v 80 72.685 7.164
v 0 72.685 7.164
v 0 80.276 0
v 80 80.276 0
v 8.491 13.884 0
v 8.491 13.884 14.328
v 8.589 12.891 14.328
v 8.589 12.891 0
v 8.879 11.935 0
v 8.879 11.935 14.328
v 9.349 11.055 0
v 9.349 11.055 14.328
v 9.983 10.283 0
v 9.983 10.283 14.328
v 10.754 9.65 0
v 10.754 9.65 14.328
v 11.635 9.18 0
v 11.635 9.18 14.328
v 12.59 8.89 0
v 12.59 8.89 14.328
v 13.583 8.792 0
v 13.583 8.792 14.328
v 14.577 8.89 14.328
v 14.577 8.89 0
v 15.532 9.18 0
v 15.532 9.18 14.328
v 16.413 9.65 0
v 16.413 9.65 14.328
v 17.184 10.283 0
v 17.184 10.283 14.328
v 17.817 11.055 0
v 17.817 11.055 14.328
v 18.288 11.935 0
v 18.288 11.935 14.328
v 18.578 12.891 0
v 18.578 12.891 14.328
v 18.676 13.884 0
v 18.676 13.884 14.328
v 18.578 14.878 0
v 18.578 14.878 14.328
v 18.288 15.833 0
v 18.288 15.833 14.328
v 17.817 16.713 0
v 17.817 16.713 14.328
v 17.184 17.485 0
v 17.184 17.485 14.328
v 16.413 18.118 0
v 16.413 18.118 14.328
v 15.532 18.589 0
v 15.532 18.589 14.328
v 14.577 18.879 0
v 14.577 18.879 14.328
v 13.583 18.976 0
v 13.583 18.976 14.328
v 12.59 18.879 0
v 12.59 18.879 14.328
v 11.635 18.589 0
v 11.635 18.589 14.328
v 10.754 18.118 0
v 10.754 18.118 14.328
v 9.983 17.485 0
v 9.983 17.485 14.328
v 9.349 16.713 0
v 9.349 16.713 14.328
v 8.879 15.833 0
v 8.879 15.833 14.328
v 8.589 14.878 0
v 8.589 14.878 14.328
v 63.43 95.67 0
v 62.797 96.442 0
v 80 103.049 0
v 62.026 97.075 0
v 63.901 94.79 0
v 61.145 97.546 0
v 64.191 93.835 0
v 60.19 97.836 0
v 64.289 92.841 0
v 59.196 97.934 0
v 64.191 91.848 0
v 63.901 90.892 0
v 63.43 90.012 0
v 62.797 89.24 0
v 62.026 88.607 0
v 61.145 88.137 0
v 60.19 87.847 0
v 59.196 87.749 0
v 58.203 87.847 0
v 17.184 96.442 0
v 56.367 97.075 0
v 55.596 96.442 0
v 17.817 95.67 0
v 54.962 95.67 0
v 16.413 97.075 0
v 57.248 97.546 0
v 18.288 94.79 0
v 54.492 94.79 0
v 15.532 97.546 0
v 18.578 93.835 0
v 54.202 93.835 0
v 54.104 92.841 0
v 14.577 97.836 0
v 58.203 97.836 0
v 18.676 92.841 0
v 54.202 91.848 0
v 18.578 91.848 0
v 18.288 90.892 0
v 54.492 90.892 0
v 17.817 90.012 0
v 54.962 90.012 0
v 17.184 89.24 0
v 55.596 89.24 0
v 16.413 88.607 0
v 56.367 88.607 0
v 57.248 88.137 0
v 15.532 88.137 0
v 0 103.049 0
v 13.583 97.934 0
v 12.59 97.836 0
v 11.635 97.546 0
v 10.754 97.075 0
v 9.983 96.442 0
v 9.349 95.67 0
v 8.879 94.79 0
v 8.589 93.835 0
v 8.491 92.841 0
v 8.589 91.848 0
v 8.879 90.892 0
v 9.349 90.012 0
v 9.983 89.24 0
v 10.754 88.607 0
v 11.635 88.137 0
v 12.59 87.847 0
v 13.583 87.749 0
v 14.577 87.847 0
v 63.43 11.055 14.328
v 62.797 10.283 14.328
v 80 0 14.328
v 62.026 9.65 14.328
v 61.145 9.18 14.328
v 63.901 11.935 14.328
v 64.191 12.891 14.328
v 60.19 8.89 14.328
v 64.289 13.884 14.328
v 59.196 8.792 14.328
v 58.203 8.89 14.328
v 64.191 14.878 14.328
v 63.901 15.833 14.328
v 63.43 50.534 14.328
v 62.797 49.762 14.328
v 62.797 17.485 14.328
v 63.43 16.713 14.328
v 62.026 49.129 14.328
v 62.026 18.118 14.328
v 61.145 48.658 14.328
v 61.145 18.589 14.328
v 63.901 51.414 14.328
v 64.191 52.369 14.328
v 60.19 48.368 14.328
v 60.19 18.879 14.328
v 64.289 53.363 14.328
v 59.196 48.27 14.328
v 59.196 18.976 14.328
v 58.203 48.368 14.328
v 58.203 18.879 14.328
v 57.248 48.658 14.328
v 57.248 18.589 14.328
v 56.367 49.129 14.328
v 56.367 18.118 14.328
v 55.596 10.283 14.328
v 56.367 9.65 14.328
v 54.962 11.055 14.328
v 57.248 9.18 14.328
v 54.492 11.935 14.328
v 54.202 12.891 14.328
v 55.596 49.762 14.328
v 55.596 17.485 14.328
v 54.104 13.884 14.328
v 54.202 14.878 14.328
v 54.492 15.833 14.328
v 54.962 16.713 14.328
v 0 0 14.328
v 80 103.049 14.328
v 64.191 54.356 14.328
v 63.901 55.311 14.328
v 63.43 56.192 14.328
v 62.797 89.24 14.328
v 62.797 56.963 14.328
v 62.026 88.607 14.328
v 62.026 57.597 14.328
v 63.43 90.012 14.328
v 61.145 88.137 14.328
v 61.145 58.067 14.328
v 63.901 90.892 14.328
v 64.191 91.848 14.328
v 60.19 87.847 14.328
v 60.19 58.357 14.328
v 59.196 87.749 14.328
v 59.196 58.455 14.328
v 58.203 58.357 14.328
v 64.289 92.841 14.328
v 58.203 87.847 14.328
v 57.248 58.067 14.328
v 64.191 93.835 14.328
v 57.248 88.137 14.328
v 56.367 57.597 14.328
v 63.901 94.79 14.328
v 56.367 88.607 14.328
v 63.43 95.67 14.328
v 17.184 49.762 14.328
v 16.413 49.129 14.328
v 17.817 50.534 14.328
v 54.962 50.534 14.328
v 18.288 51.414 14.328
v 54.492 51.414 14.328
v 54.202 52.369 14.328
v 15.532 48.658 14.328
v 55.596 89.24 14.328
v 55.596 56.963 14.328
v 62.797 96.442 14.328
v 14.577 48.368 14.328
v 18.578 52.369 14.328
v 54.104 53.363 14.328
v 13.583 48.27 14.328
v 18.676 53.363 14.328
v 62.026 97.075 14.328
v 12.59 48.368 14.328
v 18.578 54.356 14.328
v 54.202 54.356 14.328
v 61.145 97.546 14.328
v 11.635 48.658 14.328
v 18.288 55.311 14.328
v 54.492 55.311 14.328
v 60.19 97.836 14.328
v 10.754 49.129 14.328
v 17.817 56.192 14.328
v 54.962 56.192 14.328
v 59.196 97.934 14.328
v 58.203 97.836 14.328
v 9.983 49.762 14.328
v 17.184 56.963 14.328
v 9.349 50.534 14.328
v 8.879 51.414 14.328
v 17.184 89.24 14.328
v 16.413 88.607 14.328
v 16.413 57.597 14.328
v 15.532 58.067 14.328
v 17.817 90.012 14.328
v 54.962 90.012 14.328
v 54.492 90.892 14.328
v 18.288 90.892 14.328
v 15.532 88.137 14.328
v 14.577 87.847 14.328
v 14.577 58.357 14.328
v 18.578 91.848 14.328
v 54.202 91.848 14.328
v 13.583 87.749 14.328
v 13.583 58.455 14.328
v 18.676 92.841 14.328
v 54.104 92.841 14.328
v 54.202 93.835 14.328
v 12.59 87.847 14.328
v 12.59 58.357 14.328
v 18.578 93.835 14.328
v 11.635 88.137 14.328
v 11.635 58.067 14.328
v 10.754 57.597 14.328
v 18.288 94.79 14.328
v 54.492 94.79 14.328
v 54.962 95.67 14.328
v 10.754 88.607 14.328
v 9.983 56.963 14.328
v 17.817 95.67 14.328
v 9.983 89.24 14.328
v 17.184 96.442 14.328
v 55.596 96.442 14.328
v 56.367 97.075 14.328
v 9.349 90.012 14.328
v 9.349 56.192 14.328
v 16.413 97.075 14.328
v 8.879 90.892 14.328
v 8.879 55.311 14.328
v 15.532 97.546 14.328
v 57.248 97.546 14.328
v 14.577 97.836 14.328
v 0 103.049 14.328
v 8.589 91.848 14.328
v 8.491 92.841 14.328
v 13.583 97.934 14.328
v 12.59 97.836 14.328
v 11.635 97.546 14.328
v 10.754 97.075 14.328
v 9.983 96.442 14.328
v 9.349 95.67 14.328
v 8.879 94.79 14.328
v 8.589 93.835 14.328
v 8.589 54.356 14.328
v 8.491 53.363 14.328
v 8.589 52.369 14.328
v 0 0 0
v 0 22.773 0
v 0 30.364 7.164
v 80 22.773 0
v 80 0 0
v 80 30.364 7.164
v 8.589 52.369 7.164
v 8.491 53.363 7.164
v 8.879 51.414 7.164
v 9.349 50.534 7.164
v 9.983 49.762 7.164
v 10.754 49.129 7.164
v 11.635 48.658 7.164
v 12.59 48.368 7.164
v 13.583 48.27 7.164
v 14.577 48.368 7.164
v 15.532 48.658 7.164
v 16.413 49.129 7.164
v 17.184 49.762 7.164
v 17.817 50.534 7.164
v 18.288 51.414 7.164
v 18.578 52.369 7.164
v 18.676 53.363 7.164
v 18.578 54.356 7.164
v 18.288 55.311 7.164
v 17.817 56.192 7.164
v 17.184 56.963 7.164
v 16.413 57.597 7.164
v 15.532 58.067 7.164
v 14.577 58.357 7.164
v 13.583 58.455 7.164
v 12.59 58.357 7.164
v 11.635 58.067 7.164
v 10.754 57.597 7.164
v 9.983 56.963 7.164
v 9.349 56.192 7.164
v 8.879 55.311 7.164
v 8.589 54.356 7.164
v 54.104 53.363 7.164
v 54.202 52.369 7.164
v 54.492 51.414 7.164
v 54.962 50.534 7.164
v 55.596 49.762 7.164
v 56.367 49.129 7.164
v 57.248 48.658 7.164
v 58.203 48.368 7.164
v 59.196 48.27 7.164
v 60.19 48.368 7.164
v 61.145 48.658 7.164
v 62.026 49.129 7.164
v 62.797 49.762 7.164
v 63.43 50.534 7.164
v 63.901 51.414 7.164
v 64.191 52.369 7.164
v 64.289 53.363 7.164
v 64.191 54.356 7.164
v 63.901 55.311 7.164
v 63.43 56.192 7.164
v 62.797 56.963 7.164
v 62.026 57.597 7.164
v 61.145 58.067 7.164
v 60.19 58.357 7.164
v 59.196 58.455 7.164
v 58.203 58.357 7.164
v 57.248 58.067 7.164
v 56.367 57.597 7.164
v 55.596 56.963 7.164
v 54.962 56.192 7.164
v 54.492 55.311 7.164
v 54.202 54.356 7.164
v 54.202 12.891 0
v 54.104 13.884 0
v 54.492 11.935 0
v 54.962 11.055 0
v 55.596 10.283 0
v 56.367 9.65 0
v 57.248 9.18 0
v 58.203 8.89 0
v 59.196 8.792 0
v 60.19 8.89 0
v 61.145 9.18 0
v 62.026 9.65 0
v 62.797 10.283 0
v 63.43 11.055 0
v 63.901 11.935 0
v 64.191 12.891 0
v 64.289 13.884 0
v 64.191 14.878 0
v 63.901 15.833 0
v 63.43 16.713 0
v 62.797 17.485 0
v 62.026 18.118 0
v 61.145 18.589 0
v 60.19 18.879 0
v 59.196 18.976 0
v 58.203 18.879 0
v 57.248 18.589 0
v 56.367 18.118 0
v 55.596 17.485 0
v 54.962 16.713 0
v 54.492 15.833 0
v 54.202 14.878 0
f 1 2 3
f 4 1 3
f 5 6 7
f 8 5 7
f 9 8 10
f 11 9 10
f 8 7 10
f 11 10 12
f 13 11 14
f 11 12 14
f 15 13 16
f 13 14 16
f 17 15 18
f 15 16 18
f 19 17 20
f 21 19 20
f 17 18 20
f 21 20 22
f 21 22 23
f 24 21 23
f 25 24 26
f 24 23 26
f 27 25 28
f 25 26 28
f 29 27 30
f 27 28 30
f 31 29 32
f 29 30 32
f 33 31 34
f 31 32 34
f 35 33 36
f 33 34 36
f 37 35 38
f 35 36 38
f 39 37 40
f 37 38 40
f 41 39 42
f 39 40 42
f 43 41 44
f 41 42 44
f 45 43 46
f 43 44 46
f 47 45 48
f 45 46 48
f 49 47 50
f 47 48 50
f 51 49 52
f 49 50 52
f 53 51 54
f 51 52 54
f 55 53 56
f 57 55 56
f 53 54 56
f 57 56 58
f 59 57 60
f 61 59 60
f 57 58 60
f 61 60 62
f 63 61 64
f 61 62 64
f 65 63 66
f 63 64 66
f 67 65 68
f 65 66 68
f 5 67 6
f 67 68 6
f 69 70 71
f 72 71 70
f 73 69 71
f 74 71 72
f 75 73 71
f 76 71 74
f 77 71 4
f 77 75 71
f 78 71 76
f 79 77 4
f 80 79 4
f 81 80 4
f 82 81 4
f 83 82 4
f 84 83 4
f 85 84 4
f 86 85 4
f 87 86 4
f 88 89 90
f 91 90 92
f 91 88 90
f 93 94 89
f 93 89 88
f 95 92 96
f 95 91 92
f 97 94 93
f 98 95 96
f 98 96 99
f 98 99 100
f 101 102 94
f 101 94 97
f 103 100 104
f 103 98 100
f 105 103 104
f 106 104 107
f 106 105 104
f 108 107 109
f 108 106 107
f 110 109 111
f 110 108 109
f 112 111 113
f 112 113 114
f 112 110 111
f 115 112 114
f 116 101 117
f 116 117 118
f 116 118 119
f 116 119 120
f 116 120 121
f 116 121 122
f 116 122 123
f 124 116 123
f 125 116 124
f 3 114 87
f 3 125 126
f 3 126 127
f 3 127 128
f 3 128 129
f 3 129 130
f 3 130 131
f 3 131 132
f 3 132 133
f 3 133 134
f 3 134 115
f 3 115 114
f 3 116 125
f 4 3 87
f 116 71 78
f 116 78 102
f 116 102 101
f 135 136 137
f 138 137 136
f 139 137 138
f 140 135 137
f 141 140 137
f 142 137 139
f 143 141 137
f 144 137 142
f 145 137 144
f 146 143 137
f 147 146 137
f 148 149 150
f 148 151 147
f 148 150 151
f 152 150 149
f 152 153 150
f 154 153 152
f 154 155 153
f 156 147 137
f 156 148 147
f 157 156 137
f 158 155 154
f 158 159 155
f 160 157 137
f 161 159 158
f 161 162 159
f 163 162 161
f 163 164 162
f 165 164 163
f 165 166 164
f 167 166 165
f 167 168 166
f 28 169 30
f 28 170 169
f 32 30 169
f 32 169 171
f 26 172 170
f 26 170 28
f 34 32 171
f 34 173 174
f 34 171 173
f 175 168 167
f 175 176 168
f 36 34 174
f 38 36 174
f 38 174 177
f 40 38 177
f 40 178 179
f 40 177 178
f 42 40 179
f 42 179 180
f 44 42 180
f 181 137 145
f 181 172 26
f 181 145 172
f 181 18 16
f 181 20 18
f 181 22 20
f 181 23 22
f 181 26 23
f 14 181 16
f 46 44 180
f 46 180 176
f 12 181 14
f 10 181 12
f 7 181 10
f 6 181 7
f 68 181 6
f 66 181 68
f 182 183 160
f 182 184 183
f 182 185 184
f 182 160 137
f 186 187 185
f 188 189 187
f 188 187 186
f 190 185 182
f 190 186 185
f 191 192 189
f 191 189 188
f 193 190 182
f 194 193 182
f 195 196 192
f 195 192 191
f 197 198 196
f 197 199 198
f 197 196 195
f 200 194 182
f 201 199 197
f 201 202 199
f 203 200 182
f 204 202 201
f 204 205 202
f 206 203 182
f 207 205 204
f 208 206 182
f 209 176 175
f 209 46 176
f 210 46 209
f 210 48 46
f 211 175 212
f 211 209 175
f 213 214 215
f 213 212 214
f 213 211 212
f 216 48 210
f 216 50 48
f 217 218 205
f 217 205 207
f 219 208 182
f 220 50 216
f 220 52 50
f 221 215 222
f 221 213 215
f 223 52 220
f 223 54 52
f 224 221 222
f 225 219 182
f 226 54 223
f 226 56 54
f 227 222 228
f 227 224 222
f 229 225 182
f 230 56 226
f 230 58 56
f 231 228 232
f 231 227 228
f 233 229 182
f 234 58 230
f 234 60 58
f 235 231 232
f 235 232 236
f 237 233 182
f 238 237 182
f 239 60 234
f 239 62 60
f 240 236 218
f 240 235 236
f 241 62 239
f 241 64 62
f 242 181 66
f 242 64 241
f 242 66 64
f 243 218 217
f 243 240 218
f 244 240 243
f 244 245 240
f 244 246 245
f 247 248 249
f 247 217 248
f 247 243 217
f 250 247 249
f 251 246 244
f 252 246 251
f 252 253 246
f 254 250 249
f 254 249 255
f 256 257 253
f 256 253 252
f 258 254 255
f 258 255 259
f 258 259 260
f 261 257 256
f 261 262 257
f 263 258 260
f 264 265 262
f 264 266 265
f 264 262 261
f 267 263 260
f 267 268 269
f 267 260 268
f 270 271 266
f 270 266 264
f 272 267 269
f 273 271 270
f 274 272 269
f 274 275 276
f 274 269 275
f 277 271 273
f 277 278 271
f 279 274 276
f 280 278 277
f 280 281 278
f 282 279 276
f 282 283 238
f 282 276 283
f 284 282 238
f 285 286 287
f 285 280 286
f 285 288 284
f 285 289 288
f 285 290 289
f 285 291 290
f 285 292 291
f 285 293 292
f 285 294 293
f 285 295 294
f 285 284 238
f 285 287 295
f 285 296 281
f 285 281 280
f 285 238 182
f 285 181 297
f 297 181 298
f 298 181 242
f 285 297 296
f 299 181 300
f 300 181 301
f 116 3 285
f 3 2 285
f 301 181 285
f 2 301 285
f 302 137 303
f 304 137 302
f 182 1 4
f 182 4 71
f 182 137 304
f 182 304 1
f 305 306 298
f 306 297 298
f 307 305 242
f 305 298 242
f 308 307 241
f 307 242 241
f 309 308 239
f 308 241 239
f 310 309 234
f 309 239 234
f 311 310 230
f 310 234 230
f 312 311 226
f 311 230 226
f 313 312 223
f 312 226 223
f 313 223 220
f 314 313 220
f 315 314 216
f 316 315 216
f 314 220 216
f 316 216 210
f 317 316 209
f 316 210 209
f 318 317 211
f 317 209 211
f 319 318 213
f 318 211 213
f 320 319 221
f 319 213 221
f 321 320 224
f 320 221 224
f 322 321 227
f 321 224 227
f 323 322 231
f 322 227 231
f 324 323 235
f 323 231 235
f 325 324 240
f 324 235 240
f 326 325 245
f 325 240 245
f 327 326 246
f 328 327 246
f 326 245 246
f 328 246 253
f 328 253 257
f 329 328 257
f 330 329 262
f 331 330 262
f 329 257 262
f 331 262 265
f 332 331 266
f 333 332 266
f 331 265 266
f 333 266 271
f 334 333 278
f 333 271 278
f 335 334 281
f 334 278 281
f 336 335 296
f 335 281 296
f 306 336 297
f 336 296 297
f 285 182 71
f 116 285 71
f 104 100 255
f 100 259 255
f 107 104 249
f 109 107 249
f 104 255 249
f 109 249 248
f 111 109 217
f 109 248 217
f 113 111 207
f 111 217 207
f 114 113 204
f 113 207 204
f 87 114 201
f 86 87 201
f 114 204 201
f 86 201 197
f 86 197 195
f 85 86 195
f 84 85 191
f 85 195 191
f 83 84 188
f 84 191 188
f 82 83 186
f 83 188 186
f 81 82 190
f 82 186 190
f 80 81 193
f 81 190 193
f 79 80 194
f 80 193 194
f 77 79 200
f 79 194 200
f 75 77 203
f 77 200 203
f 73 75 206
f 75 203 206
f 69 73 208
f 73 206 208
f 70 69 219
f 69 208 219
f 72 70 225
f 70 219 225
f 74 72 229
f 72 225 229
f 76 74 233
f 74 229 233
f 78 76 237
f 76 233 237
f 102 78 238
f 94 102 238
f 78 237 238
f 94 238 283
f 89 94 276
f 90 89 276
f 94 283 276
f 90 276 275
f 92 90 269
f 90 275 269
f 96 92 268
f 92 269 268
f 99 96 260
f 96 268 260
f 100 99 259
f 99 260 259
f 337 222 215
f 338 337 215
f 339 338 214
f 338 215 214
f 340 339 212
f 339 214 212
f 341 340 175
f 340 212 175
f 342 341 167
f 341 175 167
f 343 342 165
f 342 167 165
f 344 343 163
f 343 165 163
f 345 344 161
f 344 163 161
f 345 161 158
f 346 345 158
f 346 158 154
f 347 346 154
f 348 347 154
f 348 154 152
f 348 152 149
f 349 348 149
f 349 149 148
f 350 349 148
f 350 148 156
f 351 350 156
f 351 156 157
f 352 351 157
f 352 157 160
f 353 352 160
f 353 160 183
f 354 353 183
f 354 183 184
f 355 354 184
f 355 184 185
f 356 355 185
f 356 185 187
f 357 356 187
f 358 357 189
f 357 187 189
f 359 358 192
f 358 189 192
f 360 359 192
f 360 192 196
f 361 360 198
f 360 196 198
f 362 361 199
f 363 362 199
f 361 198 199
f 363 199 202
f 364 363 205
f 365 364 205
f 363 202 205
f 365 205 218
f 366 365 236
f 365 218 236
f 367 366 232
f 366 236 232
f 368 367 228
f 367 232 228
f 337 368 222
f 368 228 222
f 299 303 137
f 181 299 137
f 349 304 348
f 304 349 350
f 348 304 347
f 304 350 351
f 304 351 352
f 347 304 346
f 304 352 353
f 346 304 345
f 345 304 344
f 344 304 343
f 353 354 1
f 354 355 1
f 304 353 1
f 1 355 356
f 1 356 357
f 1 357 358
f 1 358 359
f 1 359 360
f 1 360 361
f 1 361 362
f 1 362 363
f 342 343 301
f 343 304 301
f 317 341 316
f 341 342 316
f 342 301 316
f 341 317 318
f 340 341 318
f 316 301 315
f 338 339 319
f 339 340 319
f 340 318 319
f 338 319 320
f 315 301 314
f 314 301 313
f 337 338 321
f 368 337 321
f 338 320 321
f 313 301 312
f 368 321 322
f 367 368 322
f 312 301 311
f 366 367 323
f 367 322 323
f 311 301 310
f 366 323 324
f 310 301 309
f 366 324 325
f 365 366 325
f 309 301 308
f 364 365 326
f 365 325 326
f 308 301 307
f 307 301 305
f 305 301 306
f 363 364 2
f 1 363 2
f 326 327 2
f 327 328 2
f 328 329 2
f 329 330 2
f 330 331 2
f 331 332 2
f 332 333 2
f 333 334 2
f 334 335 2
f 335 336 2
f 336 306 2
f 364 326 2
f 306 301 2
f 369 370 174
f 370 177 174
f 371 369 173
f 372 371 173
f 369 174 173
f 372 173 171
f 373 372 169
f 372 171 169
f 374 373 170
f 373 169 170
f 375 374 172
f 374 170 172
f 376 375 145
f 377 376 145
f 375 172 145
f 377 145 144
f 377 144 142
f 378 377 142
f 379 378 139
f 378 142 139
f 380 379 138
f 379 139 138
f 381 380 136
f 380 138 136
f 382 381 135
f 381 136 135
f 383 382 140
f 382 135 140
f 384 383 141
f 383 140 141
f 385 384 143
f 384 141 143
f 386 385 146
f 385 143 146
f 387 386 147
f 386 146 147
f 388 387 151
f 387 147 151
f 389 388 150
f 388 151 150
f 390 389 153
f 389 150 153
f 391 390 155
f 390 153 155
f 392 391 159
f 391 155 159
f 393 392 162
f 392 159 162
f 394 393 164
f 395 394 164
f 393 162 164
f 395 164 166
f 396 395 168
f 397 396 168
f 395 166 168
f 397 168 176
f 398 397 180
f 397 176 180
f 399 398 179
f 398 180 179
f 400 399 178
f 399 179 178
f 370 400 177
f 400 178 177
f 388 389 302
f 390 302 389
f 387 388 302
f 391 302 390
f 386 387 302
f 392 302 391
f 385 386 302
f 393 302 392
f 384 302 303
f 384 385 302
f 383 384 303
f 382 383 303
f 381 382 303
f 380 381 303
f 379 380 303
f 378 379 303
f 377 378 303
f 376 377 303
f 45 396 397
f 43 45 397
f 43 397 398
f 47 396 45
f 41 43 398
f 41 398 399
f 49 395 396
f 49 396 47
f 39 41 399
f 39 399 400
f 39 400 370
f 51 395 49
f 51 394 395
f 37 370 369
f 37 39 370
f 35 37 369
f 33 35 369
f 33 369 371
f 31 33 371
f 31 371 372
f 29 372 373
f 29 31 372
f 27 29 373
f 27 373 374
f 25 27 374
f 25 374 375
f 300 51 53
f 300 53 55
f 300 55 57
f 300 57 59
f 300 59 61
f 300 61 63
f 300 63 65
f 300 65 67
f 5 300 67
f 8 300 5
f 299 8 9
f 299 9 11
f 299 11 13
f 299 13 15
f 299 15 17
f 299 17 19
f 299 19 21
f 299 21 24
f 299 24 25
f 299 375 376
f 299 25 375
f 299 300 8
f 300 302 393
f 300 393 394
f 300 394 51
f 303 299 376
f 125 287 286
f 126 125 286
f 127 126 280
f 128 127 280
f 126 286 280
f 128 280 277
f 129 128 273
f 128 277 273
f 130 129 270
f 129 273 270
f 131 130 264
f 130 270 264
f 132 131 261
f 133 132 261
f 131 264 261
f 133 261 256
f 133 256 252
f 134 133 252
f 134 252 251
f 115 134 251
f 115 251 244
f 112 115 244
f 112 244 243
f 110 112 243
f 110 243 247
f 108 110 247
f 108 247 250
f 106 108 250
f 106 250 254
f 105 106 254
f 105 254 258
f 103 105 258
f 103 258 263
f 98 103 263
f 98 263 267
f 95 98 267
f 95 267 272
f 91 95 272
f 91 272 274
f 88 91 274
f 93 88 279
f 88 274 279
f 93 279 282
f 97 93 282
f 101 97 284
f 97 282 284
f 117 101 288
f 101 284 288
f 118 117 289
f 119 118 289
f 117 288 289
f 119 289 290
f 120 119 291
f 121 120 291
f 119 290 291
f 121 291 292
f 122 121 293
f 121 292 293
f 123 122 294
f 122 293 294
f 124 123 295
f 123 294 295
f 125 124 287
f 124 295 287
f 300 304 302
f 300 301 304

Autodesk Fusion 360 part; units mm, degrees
sketch "Sketch1" plane through (0, 0, 0) normal (1, 0, 0) x (0, 1, 0)
  line L0 (0, 0) -> (0, 14.3282)
  line L1 (0, 14.3282) -> (103.0489, 14.3282)
  line L2 (103.0489, 14.3282) -> (103.0489, 0)
  line L3 (51.5244, 0) -> (51.5244, 7.1641) construction
  line L4 (51.5244, 7.1641) -> (72.6846, 7.1641)
  line L5 (72.6846, 7.1641) -> (80.2757, 0)
  line L6 (51.5244, 7.1641) -> (30.3643, 7.1641)
  line L7 (30.3643, 7.1641) -> (22.7732, 0)
  line L8 (103.0489, 0) -> (80.2757, 0)
  line L9 (22.7732, 0) -> (0, 0)
extrude "Extrude1" add sketch "Sketch1" along normal blind 80
sketch "Sketch2" plane through (0, 0, 14.3282) normal (0, 0, 1) x (-1, 0, 0)
  circle A0 centre (-13.5834, -13.8842) radius 5.0923
extrude "Extrude2" cut sketch "Sketch2" against normal through all
pattern_linear "R-Pattern1" count 3 spacing 39.4785 along (0, 1, 0) count 2 spacing 45.613 along (1, 0, 0) of "Extrude2"
